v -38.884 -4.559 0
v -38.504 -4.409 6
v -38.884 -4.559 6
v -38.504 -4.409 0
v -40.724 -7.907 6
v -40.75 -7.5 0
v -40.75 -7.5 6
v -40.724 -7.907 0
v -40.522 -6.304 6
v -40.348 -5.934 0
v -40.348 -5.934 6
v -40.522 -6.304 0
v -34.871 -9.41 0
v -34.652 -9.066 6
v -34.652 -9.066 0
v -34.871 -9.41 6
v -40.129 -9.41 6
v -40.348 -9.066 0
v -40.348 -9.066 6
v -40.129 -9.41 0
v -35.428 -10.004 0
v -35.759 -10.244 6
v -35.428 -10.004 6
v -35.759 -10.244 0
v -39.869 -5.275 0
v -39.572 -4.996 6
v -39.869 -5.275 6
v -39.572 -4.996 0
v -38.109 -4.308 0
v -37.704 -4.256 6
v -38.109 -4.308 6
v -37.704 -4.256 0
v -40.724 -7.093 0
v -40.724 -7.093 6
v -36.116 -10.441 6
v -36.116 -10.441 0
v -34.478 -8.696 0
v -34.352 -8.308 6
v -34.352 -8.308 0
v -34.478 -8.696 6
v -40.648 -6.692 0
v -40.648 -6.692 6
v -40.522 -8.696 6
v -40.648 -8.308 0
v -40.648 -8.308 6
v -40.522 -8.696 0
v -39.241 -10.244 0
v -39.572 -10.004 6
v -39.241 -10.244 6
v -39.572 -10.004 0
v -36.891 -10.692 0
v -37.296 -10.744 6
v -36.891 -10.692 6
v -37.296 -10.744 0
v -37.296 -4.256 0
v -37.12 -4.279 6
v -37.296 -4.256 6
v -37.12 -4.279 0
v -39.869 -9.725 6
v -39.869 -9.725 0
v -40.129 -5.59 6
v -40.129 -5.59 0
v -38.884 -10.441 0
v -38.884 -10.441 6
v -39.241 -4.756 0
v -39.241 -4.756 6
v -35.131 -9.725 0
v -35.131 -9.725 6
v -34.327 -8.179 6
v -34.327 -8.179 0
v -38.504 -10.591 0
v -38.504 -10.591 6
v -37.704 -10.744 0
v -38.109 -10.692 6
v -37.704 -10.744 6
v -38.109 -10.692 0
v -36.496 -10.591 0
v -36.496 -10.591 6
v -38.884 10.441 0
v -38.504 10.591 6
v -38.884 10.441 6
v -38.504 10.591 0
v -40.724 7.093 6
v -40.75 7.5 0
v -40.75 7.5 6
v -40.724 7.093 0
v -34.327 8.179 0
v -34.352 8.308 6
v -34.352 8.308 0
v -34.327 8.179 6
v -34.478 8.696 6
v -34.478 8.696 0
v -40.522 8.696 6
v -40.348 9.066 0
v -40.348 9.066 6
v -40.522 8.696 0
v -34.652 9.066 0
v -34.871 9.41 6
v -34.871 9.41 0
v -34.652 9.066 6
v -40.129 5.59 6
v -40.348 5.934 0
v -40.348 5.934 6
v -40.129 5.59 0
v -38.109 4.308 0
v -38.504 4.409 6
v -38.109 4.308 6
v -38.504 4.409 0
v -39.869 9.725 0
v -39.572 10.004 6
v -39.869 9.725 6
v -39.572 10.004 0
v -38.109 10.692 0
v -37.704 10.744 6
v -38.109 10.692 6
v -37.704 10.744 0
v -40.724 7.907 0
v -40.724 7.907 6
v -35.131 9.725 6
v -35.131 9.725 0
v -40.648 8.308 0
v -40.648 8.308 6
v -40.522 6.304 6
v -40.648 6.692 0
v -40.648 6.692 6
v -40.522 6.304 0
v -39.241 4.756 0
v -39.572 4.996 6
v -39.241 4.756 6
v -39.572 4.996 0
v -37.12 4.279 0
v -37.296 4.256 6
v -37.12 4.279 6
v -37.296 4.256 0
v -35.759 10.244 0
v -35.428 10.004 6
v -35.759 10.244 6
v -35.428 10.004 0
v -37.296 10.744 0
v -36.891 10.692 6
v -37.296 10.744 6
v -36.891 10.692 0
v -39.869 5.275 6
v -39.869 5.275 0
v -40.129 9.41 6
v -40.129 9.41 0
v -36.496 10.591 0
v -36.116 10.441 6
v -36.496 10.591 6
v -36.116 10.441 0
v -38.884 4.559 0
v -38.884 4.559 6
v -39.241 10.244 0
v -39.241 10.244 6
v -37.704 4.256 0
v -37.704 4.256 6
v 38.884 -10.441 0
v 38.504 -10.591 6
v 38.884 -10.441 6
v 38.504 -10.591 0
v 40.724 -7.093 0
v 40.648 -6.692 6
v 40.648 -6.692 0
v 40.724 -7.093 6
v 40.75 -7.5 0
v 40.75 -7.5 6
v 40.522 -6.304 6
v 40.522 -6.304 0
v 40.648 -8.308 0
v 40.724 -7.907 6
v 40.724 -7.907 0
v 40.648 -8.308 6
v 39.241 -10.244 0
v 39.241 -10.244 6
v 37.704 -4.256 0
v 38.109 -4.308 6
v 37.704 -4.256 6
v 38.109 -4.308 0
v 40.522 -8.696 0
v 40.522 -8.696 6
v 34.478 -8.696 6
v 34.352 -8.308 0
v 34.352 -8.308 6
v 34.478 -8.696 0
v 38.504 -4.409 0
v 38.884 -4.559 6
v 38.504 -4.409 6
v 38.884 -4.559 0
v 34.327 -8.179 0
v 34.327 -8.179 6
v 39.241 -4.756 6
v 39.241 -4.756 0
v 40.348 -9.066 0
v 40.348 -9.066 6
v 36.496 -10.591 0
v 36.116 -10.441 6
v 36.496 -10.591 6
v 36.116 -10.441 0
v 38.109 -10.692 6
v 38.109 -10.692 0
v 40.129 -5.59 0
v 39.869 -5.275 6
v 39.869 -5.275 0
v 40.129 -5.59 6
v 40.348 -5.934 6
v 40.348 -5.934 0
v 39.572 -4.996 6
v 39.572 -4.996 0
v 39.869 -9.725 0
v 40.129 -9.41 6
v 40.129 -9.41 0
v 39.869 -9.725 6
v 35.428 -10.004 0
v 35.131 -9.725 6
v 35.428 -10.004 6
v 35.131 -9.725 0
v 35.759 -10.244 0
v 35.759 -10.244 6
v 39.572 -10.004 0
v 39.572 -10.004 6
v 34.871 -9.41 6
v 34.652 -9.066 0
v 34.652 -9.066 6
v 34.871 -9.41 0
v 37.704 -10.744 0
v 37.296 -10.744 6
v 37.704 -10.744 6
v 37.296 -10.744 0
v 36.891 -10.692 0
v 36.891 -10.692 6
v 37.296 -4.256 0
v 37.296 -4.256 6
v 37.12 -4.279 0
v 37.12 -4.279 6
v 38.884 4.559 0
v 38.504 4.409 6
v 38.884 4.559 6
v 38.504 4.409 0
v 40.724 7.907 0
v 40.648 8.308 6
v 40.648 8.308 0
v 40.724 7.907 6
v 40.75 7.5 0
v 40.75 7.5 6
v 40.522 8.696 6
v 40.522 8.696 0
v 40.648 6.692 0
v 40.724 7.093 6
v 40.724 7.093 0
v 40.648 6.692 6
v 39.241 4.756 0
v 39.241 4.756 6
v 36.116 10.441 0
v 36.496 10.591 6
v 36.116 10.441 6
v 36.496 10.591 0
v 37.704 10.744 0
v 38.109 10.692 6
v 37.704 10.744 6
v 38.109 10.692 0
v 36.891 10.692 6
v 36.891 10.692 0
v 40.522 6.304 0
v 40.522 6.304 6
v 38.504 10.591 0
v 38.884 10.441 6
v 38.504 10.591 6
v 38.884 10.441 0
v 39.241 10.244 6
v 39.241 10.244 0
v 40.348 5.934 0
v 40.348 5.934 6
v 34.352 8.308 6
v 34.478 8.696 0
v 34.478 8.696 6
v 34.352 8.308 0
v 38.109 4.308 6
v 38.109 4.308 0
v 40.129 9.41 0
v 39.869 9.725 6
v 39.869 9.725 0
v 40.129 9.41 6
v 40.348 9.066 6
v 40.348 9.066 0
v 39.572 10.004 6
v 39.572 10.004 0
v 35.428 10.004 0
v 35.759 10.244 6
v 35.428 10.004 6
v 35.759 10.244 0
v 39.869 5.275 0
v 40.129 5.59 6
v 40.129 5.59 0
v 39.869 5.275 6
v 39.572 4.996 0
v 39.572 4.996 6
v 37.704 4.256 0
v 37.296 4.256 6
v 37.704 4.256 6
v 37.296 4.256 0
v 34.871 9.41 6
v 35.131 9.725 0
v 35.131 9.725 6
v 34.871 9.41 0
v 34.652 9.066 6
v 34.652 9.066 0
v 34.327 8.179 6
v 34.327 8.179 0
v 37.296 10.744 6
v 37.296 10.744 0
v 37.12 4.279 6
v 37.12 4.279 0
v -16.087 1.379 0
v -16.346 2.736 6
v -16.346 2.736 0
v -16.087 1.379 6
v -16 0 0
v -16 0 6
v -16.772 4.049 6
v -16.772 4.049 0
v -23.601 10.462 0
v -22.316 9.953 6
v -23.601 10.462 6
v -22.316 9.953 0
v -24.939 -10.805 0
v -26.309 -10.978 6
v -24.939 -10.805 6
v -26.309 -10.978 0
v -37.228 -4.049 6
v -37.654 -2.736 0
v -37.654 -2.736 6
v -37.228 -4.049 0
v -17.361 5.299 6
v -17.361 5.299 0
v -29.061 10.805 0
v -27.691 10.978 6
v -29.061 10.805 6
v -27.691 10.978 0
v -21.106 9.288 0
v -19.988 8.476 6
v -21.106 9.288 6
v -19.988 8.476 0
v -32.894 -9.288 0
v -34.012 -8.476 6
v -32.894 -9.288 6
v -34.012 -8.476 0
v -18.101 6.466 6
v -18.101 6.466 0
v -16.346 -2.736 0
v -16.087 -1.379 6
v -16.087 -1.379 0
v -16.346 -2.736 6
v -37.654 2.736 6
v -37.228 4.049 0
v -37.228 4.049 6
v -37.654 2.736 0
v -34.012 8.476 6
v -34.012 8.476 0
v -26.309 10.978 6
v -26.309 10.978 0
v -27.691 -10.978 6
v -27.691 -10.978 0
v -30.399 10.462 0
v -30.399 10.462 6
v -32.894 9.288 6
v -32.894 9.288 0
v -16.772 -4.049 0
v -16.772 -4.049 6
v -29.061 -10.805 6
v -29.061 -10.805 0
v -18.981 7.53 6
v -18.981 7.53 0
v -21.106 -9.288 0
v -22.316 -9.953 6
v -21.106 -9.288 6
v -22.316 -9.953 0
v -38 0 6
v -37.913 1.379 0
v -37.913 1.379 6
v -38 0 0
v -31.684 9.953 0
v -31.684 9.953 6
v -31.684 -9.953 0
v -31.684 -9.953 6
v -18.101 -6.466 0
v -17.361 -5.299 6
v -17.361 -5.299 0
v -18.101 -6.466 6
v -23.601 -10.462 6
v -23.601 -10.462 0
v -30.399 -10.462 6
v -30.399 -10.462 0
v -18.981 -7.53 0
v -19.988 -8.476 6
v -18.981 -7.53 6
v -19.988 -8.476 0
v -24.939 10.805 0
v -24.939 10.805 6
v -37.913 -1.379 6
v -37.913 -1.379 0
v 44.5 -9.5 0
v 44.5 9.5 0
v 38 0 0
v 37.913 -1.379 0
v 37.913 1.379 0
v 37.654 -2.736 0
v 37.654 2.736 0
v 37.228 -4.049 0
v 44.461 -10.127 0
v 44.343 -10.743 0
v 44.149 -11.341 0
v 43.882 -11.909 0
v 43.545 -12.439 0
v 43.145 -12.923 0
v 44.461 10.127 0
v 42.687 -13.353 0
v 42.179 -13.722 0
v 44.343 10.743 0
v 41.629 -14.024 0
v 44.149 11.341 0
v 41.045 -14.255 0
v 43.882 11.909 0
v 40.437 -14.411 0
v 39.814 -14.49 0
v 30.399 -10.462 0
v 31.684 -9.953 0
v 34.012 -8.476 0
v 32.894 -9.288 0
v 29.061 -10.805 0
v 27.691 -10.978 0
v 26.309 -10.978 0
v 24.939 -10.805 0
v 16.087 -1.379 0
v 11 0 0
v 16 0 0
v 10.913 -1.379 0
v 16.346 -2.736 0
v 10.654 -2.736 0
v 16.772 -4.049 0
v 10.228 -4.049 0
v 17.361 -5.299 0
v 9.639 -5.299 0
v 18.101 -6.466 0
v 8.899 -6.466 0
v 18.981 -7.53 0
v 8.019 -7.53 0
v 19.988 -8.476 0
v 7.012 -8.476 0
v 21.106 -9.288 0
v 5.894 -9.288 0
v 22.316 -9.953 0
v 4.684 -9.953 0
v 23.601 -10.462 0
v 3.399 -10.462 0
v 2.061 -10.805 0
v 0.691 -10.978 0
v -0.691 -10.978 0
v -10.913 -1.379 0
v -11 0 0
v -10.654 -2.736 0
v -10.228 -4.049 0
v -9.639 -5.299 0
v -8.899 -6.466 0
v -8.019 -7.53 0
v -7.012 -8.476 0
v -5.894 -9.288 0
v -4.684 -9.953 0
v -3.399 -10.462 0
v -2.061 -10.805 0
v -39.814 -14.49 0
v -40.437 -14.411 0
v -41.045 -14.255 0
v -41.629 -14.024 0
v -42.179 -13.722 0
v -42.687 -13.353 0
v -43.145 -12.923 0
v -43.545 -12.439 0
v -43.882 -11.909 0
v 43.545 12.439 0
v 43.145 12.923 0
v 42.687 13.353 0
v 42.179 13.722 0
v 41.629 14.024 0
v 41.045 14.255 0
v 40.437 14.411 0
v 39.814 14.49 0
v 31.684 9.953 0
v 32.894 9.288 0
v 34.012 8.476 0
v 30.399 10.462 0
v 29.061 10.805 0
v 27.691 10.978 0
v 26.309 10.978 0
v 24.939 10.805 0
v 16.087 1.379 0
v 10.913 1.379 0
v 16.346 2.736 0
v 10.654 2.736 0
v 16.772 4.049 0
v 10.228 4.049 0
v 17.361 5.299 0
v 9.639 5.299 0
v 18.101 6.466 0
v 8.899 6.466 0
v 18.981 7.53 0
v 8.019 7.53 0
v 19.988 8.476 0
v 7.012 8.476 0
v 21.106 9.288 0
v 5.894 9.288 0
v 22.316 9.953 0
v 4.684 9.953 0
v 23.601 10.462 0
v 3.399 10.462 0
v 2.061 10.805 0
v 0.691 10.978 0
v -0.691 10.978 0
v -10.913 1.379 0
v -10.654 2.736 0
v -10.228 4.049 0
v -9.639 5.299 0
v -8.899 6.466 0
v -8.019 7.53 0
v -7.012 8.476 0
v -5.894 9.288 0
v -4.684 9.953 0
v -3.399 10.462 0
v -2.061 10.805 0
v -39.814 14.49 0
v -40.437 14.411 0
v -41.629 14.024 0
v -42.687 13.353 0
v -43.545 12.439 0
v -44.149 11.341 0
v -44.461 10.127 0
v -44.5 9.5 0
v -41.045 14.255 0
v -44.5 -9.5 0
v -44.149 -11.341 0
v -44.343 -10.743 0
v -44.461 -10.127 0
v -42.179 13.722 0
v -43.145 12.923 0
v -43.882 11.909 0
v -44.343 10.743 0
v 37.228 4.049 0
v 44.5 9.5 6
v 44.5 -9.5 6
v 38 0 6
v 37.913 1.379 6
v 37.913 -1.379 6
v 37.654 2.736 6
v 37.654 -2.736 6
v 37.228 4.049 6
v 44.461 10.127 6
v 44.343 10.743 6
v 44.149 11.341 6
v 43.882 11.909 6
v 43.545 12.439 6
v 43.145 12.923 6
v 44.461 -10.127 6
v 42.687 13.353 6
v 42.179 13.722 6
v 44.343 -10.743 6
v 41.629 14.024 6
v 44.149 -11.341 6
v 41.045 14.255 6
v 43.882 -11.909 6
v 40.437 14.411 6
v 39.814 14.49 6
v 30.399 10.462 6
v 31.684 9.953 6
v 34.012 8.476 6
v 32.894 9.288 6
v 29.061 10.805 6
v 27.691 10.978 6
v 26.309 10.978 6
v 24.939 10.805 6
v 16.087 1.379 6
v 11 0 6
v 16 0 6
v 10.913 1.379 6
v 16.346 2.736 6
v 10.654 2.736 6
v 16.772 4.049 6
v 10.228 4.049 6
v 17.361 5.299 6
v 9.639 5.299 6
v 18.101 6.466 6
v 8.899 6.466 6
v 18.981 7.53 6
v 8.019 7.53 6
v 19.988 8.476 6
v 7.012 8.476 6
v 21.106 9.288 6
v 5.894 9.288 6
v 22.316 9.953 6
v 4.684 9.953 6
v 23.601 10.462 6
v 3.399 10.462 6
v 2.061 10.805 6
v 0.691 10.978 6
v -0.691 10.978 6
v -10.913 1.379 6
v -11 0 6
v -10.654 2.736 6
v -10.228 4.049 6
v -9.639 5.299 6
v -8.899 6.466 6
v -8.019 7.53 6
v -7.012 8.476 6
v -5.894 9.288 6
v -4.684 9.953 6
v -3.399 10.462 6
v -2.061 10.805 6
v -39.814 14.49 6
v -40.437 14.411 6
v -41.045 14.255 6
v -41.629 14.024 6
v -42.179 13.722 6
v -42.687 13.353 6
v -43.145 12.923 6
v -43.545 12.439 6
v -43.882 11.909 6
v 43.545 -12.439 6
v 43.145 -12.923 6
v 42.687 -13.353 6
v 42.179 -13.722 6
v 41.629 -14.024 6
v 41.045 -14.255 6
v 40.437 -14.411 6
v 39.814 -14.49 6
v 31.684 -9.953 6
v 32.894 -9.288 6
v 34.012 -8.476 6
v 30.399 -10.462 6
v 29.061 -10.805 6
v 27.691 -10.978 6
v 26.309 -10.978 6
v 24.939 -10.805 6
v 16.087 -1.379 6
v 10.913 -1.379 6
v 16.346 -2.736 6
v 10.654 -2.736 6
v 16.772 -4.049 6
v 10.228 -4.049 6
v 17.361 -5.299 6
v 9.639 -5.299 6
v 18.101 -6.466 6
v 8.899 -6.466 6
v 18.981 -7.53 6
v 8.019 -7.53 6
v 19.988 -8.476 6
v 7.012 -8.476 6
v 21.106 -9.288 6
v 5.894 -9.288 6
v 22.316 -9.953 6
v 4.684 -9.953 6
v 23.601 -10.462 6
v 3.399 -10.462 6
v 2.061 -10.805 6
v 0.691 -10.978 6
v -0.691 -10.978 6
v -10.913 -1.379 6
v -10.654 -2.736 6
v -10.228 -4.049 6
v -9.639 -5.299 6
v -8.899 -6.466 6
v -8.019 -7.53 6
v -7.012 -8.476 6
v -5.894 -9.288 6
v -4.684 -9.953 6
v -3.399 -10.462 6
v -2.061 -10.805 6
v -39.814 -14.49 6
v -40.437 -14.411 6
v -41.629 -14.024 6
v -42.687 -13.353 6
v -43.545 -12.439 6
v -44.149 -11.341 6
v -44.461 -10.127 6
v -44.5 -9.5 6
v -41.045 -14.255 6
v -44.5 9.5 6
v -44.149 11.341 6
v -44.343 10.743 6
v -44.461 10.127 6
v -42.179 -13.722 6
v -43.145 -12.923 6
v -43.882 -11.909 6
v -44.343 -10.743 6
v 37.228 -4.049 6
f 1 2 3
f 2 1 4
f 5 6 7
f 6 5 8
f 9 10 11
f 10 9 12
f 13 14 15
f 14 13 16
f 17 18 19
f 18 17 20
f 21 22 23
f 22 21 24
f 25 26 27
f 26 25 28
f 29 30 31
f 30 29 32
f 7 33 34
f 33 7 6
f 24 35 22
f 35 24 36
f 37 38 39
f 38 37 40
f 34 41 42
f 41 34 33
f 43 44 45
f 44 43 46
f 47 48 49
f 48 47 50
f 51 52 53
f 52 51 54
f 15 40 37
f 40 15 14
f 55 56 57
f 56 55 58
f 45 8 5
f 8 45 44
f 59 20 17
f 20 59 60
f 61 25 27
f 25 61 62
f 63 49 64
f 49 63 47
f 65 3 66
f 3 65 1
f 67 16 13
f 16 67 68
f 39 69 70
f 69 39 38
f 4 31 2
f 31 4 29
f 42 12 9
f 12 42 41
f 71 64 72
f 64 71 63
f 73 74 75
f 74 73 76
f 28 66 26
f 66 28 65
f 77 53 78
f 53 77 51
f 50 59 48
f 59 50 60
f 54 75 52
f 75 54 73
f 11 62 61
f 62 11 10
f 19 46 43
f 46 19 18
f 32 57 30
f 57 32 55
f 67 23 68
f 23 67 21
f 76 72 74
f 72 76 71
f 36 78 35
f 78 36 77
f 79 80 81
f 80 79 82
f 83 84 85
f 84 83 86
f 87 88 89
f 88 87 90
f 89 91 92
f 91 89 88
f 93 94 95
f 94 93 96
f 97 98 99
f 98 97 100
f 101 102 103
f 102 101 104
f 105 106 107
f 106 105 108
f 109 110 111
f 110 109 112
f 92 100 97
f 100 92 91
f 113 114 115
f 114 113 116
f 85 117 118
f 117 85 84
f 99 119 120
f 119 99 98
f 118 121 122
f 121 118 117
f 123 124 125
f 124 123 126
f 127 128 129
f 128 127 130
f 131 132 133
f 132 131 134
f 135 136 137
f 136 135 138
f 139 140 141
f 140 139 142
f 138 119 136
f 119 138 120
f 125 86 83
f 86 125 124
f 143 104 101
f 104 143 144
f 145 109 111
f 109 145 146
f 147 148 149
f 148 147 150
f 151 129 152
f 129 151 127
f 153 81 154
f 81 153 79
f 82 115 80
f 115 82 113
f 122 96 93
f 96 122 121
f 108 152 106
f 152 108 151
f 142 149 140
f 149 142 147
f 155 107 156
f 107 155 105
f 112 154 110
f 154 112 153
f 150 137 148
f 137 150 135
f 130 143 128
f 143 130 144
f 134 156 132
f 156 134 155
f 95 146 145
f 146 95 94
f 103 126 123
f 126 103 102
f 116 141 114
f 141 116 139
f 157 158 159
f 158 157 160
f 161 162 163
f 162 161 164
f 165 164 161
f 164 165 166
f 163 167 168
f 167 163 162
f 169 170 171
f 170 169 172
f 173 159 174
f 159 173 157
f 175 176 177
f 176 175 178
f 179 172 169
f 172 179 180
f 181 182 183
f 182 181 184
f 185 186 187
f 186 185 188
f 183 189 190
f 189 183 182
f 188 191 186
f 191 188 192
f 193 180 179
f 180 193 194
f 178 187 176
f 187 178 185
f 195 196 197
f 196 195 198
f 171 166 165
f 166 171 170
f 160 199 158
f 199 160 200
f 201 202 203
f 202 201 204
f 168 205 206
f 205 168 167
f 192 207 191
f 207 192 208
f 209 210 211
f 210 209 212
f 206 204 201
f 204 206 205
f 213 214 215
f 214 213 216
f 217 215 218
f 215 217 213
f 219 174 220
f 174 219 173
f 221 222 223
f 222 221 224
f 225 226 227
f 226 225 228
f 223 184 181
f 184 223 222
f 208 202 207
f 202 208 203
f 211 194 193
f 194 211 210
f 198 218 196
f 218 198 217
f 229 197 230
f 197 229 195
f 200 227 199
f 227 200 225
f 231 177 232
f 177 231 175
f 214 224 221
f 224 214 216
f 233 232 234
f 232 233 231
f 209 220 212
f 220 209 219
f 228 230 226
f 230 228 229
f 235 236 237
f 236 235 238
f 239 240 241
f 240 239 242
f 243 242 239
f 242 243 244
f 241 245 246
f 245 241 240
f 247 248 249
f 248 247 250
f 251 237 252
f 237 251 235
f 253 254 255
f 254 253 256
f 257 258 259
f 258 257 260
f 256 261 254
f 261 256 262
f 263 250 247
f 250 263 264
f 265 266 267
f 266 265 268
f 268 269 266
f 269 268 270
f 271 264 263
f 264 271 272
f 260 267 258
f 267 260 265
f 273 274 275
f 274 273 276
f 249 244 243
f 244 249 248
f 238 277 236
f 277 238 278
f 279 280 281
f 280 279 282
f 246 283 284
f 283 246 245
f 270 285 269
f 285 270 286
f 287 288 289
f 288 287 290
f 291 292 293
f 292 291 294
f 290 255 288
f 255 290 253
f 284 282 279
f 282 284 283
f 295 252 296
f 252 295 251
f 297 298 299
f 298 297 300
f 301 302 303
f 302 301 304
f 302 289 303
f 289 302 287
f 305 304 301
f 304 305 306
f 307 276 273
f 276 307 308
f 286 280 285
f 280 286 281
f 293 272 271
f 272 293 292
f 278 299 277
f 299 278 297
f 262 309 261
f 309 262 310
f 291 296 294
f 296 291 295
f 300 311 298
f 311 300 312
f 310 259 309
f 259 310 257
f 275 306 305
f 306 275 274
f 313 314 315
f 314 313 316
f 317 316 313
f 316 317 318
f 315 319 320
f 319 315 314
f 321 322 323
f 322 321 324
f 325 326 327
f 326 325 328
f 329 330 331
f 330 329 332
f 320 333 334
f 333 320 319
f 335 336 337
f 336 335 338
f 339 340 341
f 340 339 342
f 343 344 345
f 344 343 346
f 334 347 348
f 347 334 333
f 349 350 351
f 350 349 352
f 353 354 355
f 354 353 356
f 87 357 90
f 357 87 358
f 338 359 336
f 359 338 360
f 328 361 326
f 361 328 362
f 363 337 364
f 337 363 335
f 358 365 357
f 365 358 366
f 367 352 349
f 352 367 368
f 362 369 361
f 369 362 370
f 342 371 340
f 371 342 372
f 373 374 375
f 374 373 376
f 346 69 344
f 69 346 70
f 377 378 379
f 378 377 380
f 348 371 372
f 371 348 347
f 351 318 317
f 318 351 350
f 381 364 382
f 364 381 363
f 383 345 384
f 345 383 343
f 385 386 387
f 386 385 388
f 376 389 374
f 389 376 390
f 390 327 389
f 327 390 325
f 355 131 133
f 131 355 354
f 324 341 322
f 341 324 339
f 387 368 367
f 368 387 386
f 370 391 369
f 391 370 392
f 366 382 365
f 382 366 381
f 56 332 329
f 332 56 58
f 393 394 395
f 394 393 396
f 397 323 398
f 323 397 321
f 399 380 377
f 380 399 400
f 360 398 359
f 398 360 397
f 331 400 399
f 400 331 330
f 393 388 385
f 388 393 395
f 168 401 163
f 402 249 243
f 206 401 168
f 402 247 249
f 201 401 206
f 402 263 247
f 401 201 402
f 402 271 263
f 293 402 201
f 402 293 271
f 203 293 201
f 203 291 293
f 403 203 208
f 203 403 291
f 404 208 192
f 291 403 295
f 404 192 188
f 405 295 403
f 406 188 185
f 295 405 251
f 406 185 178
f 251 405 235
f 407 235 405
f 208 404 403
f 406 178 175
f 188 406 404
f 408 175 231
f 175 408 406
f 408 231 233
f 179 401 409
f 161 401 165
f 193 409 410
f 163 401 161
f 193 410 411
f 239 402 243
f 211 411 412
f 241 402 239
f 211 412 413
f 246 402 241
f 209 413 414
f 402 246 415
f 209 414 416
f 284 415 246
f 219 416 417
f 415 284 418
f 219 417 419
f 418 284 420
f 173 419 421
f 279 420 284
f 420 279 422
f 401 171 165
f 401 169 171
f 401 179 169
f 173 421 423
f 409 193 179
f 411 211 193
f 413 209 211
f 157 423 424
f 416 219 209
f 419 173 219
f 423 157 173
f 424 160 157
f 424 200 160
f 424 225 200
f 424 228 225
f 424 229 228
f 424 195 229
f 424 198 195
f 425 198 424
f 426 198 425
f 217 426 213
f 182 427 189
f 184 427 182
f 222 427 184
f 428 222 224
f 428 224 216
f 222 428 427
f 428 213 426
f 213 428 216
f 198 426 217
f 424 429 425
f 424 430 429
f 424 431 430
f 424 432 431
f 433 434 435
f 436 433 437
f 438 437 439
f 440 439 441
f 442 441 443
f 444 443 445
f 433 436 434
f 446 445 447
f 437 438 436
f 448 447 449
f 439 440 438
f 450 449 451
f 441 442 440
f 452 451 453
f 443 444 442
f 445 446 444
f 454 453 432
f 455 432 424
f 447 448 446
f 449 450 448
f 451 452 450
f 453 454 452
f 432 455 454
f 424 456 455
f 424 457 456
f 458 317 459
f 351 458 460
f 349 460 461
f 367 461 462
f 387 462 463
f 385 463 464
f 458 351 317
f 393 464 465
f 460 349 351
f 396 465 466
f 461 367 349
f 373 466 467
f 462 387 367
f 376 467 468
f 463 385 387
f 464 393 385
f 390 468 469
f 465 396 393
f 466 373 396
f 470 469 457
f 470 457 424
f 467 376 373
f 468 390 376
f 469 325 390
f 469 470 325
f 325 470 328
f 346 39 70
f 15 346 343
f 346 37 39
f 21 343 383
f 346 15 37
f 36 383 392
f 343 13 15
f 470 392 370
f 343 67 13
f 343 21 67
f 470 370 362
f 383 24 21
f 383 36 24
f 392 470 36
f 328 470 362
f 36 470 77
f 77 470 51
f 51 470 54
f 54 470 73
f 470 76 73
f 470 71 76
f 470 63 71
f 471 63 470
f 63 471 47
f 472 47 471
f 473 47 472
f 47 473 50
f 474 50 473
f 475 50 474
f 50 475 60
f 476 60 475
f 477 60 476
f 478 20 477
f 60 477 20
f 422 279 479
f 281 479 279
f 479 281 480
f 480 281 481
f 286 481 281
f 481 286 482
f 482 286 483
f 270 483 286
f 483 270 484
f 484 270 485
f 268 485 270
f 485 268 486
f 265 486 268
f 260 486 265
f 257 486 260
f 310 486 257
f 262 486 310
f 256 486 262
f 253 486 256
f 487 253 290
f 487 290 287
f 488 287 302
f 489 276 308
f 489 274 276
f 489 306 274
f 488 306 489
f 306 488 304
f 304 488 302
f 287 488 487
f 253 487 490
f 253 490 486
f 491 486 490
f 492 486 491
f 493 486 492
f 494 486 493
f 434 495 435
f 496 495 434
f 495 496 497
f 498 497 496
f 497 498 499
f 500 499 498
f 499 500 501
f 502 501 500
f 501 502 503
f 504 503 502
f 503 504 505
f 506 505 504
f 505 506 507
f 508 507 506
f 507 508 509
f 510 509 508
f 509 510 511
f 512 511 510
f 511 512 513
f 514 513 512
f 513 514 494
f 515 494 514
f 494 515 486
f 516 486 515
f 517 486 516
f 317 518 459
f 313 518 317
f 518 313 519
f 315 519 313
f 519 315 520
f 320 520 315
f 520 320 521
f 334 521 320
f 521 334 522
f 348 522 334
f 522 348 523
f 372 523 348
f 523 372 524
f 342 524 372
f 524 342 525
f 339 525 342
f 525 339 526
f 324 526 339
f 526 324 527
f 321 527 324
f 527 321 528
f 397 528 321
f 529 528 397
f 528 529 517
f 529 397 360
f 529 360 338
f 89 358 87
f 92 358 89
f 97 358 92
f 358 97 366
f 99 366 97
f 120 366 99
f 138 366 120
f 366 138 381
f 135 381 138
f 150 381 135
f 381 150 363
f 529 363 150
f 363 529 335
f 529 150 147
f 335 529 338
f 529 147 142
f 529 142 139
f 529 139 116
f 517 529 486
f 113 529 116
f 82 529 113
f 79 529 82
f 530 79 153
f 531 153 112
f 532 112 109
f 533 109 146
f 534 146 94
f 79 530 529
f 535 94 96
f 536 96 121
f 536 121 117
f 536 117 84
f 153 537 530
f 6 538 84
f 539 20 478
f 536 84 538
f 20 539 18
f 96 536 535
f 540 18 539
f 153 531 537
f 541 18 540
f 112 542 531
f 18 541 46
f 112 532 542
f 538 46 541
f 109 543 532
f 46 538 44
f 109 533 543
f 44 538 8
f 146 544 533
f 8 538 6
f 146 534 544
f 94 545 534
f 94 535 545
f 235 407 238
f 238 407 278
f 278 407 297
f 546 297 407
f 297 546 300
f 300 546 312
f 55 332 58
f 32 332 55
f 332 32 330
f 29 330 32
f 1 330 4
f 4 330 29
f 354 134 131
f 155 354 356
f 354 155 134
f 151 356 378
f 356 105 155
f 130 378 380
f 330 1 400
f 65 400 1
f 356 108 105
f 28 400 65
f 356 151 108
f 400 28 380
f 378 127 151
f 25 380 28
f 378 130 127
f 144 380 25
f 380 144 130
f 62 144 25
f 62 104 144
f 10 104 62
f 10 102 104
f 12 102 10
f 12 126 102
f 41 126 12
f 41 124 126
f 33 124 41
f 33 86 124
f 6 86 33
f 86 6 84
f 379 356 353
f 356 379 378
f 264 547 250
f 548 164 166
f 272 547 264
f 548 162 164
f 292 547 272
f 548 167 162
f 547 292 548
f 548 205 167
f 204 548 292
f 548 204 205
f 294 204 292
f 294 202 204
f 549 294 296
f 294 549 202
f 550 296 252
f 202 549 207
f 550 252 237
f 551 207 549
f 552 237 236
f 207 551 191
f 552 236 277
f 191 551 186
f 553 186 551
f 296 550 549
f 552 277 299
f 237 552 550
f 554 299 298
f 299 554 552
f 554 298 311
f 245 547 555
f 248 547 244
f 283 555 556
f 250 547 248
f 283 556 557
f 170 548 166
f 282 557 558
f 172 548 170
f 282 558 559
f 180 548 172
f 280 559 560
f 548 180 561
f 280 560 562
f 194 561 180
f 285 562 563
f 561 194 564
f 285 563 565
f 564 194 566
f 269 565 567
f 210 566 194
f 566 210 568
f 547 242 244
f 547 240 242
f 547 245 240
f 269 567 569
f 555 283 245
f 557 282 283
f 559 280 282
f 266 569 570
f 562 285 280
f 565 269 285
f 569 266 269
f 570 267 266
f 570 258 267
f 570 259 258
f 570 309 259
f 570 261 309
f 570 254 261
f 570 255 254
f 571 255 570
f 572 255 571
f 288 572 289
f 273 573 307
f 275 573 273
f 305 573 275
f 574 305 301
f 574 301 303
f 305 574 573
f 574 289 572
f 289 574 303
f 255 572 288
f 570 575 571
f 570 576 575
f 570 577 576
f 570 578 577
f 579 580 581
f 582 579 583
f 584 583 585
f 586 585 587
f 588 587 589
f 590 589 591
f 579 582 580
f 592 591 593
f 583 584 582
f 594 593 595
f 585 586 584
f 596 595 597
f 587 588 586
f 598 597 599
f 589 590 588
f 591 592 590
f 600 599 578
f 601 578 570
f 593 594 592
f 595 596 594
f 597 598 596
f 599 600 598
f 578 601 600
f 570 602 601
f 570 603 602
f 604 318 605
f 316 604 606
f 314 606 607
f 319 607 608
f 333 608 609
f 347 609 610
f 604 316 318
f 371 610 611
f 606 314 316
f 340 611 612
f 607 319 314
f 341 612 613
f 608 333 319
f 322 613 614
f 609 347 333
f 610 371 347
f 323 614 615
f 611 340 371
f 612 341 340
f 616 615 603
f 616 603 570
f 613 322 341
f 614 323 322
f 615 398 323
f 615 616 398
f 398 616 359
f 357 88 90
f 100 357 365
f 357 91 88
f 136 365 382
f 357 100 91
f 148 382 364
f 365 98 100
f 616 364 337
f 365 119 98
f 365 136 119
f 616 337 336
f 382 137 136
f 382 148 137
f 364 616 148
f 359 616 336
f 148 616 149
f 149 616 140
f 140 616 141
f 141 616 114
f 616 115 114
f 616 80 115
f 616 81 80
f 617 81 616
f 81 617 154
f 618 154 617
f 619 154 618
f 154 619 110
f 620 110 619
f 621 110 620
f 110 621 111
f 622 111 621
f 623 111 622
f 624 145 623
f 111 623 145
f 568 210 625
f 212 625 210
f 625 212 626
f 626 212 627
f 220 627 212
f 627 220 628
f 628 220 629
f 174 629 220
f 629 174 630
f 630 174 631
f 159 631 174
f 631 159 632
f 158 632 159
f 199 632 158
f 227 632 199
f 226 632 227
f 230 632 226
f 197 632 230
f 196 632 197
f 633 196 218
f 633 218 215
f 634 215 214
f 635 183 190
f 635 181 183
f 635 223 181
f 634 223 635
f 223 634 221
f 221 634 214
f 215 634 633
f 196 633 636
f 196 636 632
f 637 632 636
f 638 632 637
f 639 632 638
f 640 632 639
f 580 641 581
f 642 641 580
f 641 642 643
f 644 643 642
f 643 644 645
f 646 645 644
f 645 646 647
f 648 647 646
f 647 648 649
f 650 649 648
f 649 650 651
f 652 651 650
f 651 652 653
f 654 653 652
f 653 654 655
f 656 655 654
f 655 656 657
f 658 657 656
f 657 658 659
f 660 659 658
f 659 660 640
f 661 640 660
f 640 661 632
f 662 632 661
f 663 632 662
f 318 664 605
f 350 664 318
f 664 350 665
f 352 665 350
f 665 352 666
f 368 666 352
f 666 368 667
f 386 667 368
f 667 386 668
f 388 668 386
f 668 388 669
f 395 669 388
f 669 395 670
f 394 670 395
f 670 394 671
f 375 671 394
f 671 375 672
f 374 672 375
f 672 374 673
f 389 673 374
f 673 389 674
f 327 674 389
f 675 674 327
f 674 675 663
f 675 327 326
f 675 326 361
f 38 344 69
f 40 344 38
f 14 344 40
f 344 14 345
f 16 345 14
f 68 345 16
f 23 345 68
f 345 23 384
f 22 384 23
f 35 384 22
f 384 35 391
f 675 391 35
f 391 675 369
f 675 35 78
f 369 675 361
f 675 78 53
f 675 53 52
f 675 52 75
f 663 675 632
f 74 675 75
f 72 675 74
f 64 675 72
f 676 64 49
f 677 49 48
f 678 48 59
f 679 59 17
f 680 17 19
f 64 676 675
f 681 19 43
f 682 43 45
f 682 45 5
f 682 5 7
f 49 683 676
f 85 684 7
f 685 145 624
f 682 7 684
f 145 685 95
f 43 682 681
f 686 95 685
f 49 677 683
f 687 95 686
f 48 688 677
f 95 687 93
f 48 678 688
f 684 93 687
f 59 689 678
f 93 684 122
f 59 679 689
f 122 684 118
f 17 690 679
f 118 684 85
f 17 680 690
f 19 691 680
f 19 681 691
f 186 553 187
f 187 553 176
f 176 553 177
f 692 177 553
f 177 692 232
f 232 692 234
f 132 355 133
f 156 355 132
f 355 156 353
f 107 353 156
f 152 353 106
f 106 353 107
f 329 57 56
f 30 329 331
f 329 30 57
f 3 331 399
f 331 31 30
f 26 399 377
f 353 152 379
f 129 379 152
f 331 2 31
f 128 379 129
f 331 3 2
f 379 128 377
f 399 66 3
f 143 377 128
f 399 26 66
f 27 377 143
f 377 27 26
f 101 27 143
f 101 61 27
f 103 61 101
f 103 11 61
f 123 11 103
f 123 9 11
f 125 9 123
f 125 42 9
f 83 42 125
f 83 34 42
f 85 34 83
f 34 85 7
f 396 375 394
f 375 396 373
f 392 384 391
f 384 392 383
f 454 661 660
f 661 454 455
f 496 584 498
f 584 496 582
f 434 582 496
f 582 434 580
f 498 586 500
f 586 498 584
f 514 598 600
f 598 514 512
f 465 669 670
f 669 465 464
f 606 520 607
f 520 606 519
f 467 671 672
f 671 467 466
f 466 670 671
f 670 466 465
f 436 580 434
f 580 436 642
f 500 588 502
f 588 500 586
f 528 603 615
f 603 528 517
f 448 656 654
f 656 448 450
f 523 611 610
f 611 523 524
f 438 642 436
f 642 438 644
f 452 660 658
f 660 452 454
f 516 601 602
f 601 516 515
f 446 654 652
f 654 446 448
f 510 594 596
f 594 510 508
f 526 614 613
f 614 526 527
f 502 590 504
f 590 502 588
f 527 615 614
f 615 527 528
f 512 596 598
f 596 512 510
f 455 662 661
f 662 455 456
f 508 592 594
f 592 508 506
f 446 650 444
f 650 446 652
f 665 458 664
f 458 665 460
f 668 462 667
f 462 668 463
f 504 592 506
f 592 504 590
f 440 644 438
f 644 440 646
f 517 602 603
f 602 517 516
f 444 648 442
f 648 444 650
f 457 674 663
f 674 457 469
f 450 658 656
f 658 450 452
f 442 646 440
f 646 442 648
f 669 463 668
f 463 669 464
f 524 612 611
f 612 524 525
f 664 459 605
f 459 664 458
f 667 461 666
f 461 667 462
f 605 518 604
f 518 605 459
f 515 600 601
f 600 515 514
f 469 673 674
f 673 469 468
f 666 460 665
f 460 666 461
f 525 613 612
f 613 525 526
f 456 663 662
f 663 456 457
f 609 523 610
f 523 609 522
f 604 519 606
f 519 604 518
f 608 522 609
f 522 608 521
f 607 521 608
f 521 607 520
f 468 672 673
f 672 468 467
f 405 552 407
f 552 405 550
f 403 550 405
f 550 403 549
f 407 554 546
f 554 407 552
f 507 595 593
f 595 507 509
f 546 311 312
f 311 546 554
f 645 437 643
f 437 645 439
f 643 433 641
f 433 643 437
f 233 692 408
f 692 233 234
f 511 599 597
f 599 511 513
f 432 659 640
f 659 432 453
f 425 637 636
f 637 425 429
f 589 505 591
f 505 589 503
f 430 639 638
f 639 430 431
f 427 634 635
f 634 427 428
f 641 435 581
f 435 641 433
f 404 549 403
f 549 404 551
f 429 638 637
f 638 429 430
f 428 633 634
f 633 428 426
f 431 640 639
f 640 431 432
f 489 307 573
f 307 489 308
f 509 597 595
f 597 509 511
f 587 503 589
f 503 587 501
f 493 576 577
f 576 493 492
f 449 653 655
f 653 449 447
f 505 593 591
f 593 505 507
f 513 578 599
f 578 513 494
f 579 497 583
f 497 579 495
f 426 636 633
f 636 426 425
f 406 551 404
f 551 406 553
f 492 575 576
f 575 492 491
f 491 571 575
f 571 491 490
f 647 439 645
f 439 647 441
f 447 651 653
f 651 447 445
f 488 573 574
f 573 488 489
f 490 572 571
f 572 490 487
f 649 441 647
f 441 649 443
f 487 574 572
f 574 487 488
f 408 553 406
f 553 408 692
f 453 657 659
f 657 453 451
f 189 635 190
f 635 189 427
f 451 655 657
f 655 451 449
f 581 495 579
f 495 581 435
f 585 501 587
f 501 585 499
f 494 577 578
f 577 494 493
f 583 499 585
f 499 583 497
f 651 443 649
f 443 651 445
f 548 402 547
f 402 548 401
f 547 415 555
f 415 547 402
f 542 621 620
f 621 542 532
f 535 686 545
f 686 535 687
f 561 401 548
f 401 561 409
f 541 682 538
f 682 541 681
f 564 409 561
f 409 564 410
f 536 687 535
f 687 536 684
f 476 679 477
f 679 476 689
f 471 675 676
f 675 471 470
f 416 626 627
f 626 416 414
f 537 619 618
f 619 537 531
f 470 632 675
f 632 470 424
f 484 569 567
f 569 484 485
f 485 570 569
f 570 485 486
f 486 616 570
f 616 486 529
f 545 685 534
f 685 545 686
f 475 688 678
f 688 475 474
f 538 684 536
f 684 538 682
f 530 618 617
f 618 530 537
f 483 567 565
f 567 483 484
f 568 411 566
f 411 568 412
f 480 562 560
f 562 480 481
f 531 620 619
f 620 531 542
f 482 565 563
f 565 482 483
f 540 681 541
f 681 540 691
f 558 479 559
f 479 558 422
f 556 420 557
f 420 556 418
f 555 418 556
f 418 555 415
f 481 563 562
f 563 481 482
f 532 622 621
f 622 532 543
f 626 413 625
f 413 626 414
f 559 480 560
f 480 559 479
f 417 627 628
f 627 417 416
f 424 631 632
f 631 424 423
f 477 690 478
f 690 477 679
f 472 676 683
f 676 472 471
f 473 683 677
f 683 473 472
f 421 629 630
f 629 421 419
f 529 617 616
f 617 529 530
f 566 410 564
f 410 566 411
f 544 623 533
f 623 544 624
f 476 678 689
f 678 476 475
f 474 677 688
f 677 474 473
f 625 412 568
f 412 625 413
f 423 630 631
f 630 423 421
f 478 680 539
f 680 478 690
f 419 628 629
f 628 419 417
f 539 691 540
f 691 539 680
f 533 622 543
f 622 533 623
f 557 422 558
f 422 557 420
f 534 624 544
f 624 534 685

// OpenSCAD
$fn = 50;


difference() {
	union() {
		hull() {
			translate(v = [-39.5000000000, 9.5000000000, 0]) {
				cylinder(h = 6, r = 5);
			}
			translate(v = [39.5000000000, 9.5000000000, 0]) {
				cylinder(h = 6, r = 5);
			}
			translate(v = [-39.5000000000, -9.5000000000, 0]) {
				cylinder(h = 6, r = 5);
			}
			translate(v = [39.5000000000, -9.5000000000, 0]) {
				cylinder(h = 6, r = 5);
			}
		}
	}
	union() {
		#translate(v = [-37.5000000000, -7.5000000000, -100.0000000000]) {
			cylinder(h = 200, r = 3.2500000000);
		}
		#translate(v = [-37.5000000000, 7.5000000000, -100.0000000000]) {
			cylinder(h = 200, r = 3.2500000000);
		}
		#translate(v = [37.5000000000, -7.5000000000, -100.0000000000]) {
			cylinder(h = 200, r = 3.2500000000);
		}
		#translate(v = [37.5000000000, 7.5000000000, -100.0000000000]) {
			cylinder(h = 200, r = 3.2500000000);
		}
		#translate(v = [-27.0000000000, 0, 0]) {
			cylinder(h = 6, r = 11.0000000000);
		}
		#cylinder(h = 6, r = 11.0000000000);
		#translate(v = [27.0000000000, 0, 0]) {
			cylinder(h = 6, r = 11.0000000000);
		}
	}
}
